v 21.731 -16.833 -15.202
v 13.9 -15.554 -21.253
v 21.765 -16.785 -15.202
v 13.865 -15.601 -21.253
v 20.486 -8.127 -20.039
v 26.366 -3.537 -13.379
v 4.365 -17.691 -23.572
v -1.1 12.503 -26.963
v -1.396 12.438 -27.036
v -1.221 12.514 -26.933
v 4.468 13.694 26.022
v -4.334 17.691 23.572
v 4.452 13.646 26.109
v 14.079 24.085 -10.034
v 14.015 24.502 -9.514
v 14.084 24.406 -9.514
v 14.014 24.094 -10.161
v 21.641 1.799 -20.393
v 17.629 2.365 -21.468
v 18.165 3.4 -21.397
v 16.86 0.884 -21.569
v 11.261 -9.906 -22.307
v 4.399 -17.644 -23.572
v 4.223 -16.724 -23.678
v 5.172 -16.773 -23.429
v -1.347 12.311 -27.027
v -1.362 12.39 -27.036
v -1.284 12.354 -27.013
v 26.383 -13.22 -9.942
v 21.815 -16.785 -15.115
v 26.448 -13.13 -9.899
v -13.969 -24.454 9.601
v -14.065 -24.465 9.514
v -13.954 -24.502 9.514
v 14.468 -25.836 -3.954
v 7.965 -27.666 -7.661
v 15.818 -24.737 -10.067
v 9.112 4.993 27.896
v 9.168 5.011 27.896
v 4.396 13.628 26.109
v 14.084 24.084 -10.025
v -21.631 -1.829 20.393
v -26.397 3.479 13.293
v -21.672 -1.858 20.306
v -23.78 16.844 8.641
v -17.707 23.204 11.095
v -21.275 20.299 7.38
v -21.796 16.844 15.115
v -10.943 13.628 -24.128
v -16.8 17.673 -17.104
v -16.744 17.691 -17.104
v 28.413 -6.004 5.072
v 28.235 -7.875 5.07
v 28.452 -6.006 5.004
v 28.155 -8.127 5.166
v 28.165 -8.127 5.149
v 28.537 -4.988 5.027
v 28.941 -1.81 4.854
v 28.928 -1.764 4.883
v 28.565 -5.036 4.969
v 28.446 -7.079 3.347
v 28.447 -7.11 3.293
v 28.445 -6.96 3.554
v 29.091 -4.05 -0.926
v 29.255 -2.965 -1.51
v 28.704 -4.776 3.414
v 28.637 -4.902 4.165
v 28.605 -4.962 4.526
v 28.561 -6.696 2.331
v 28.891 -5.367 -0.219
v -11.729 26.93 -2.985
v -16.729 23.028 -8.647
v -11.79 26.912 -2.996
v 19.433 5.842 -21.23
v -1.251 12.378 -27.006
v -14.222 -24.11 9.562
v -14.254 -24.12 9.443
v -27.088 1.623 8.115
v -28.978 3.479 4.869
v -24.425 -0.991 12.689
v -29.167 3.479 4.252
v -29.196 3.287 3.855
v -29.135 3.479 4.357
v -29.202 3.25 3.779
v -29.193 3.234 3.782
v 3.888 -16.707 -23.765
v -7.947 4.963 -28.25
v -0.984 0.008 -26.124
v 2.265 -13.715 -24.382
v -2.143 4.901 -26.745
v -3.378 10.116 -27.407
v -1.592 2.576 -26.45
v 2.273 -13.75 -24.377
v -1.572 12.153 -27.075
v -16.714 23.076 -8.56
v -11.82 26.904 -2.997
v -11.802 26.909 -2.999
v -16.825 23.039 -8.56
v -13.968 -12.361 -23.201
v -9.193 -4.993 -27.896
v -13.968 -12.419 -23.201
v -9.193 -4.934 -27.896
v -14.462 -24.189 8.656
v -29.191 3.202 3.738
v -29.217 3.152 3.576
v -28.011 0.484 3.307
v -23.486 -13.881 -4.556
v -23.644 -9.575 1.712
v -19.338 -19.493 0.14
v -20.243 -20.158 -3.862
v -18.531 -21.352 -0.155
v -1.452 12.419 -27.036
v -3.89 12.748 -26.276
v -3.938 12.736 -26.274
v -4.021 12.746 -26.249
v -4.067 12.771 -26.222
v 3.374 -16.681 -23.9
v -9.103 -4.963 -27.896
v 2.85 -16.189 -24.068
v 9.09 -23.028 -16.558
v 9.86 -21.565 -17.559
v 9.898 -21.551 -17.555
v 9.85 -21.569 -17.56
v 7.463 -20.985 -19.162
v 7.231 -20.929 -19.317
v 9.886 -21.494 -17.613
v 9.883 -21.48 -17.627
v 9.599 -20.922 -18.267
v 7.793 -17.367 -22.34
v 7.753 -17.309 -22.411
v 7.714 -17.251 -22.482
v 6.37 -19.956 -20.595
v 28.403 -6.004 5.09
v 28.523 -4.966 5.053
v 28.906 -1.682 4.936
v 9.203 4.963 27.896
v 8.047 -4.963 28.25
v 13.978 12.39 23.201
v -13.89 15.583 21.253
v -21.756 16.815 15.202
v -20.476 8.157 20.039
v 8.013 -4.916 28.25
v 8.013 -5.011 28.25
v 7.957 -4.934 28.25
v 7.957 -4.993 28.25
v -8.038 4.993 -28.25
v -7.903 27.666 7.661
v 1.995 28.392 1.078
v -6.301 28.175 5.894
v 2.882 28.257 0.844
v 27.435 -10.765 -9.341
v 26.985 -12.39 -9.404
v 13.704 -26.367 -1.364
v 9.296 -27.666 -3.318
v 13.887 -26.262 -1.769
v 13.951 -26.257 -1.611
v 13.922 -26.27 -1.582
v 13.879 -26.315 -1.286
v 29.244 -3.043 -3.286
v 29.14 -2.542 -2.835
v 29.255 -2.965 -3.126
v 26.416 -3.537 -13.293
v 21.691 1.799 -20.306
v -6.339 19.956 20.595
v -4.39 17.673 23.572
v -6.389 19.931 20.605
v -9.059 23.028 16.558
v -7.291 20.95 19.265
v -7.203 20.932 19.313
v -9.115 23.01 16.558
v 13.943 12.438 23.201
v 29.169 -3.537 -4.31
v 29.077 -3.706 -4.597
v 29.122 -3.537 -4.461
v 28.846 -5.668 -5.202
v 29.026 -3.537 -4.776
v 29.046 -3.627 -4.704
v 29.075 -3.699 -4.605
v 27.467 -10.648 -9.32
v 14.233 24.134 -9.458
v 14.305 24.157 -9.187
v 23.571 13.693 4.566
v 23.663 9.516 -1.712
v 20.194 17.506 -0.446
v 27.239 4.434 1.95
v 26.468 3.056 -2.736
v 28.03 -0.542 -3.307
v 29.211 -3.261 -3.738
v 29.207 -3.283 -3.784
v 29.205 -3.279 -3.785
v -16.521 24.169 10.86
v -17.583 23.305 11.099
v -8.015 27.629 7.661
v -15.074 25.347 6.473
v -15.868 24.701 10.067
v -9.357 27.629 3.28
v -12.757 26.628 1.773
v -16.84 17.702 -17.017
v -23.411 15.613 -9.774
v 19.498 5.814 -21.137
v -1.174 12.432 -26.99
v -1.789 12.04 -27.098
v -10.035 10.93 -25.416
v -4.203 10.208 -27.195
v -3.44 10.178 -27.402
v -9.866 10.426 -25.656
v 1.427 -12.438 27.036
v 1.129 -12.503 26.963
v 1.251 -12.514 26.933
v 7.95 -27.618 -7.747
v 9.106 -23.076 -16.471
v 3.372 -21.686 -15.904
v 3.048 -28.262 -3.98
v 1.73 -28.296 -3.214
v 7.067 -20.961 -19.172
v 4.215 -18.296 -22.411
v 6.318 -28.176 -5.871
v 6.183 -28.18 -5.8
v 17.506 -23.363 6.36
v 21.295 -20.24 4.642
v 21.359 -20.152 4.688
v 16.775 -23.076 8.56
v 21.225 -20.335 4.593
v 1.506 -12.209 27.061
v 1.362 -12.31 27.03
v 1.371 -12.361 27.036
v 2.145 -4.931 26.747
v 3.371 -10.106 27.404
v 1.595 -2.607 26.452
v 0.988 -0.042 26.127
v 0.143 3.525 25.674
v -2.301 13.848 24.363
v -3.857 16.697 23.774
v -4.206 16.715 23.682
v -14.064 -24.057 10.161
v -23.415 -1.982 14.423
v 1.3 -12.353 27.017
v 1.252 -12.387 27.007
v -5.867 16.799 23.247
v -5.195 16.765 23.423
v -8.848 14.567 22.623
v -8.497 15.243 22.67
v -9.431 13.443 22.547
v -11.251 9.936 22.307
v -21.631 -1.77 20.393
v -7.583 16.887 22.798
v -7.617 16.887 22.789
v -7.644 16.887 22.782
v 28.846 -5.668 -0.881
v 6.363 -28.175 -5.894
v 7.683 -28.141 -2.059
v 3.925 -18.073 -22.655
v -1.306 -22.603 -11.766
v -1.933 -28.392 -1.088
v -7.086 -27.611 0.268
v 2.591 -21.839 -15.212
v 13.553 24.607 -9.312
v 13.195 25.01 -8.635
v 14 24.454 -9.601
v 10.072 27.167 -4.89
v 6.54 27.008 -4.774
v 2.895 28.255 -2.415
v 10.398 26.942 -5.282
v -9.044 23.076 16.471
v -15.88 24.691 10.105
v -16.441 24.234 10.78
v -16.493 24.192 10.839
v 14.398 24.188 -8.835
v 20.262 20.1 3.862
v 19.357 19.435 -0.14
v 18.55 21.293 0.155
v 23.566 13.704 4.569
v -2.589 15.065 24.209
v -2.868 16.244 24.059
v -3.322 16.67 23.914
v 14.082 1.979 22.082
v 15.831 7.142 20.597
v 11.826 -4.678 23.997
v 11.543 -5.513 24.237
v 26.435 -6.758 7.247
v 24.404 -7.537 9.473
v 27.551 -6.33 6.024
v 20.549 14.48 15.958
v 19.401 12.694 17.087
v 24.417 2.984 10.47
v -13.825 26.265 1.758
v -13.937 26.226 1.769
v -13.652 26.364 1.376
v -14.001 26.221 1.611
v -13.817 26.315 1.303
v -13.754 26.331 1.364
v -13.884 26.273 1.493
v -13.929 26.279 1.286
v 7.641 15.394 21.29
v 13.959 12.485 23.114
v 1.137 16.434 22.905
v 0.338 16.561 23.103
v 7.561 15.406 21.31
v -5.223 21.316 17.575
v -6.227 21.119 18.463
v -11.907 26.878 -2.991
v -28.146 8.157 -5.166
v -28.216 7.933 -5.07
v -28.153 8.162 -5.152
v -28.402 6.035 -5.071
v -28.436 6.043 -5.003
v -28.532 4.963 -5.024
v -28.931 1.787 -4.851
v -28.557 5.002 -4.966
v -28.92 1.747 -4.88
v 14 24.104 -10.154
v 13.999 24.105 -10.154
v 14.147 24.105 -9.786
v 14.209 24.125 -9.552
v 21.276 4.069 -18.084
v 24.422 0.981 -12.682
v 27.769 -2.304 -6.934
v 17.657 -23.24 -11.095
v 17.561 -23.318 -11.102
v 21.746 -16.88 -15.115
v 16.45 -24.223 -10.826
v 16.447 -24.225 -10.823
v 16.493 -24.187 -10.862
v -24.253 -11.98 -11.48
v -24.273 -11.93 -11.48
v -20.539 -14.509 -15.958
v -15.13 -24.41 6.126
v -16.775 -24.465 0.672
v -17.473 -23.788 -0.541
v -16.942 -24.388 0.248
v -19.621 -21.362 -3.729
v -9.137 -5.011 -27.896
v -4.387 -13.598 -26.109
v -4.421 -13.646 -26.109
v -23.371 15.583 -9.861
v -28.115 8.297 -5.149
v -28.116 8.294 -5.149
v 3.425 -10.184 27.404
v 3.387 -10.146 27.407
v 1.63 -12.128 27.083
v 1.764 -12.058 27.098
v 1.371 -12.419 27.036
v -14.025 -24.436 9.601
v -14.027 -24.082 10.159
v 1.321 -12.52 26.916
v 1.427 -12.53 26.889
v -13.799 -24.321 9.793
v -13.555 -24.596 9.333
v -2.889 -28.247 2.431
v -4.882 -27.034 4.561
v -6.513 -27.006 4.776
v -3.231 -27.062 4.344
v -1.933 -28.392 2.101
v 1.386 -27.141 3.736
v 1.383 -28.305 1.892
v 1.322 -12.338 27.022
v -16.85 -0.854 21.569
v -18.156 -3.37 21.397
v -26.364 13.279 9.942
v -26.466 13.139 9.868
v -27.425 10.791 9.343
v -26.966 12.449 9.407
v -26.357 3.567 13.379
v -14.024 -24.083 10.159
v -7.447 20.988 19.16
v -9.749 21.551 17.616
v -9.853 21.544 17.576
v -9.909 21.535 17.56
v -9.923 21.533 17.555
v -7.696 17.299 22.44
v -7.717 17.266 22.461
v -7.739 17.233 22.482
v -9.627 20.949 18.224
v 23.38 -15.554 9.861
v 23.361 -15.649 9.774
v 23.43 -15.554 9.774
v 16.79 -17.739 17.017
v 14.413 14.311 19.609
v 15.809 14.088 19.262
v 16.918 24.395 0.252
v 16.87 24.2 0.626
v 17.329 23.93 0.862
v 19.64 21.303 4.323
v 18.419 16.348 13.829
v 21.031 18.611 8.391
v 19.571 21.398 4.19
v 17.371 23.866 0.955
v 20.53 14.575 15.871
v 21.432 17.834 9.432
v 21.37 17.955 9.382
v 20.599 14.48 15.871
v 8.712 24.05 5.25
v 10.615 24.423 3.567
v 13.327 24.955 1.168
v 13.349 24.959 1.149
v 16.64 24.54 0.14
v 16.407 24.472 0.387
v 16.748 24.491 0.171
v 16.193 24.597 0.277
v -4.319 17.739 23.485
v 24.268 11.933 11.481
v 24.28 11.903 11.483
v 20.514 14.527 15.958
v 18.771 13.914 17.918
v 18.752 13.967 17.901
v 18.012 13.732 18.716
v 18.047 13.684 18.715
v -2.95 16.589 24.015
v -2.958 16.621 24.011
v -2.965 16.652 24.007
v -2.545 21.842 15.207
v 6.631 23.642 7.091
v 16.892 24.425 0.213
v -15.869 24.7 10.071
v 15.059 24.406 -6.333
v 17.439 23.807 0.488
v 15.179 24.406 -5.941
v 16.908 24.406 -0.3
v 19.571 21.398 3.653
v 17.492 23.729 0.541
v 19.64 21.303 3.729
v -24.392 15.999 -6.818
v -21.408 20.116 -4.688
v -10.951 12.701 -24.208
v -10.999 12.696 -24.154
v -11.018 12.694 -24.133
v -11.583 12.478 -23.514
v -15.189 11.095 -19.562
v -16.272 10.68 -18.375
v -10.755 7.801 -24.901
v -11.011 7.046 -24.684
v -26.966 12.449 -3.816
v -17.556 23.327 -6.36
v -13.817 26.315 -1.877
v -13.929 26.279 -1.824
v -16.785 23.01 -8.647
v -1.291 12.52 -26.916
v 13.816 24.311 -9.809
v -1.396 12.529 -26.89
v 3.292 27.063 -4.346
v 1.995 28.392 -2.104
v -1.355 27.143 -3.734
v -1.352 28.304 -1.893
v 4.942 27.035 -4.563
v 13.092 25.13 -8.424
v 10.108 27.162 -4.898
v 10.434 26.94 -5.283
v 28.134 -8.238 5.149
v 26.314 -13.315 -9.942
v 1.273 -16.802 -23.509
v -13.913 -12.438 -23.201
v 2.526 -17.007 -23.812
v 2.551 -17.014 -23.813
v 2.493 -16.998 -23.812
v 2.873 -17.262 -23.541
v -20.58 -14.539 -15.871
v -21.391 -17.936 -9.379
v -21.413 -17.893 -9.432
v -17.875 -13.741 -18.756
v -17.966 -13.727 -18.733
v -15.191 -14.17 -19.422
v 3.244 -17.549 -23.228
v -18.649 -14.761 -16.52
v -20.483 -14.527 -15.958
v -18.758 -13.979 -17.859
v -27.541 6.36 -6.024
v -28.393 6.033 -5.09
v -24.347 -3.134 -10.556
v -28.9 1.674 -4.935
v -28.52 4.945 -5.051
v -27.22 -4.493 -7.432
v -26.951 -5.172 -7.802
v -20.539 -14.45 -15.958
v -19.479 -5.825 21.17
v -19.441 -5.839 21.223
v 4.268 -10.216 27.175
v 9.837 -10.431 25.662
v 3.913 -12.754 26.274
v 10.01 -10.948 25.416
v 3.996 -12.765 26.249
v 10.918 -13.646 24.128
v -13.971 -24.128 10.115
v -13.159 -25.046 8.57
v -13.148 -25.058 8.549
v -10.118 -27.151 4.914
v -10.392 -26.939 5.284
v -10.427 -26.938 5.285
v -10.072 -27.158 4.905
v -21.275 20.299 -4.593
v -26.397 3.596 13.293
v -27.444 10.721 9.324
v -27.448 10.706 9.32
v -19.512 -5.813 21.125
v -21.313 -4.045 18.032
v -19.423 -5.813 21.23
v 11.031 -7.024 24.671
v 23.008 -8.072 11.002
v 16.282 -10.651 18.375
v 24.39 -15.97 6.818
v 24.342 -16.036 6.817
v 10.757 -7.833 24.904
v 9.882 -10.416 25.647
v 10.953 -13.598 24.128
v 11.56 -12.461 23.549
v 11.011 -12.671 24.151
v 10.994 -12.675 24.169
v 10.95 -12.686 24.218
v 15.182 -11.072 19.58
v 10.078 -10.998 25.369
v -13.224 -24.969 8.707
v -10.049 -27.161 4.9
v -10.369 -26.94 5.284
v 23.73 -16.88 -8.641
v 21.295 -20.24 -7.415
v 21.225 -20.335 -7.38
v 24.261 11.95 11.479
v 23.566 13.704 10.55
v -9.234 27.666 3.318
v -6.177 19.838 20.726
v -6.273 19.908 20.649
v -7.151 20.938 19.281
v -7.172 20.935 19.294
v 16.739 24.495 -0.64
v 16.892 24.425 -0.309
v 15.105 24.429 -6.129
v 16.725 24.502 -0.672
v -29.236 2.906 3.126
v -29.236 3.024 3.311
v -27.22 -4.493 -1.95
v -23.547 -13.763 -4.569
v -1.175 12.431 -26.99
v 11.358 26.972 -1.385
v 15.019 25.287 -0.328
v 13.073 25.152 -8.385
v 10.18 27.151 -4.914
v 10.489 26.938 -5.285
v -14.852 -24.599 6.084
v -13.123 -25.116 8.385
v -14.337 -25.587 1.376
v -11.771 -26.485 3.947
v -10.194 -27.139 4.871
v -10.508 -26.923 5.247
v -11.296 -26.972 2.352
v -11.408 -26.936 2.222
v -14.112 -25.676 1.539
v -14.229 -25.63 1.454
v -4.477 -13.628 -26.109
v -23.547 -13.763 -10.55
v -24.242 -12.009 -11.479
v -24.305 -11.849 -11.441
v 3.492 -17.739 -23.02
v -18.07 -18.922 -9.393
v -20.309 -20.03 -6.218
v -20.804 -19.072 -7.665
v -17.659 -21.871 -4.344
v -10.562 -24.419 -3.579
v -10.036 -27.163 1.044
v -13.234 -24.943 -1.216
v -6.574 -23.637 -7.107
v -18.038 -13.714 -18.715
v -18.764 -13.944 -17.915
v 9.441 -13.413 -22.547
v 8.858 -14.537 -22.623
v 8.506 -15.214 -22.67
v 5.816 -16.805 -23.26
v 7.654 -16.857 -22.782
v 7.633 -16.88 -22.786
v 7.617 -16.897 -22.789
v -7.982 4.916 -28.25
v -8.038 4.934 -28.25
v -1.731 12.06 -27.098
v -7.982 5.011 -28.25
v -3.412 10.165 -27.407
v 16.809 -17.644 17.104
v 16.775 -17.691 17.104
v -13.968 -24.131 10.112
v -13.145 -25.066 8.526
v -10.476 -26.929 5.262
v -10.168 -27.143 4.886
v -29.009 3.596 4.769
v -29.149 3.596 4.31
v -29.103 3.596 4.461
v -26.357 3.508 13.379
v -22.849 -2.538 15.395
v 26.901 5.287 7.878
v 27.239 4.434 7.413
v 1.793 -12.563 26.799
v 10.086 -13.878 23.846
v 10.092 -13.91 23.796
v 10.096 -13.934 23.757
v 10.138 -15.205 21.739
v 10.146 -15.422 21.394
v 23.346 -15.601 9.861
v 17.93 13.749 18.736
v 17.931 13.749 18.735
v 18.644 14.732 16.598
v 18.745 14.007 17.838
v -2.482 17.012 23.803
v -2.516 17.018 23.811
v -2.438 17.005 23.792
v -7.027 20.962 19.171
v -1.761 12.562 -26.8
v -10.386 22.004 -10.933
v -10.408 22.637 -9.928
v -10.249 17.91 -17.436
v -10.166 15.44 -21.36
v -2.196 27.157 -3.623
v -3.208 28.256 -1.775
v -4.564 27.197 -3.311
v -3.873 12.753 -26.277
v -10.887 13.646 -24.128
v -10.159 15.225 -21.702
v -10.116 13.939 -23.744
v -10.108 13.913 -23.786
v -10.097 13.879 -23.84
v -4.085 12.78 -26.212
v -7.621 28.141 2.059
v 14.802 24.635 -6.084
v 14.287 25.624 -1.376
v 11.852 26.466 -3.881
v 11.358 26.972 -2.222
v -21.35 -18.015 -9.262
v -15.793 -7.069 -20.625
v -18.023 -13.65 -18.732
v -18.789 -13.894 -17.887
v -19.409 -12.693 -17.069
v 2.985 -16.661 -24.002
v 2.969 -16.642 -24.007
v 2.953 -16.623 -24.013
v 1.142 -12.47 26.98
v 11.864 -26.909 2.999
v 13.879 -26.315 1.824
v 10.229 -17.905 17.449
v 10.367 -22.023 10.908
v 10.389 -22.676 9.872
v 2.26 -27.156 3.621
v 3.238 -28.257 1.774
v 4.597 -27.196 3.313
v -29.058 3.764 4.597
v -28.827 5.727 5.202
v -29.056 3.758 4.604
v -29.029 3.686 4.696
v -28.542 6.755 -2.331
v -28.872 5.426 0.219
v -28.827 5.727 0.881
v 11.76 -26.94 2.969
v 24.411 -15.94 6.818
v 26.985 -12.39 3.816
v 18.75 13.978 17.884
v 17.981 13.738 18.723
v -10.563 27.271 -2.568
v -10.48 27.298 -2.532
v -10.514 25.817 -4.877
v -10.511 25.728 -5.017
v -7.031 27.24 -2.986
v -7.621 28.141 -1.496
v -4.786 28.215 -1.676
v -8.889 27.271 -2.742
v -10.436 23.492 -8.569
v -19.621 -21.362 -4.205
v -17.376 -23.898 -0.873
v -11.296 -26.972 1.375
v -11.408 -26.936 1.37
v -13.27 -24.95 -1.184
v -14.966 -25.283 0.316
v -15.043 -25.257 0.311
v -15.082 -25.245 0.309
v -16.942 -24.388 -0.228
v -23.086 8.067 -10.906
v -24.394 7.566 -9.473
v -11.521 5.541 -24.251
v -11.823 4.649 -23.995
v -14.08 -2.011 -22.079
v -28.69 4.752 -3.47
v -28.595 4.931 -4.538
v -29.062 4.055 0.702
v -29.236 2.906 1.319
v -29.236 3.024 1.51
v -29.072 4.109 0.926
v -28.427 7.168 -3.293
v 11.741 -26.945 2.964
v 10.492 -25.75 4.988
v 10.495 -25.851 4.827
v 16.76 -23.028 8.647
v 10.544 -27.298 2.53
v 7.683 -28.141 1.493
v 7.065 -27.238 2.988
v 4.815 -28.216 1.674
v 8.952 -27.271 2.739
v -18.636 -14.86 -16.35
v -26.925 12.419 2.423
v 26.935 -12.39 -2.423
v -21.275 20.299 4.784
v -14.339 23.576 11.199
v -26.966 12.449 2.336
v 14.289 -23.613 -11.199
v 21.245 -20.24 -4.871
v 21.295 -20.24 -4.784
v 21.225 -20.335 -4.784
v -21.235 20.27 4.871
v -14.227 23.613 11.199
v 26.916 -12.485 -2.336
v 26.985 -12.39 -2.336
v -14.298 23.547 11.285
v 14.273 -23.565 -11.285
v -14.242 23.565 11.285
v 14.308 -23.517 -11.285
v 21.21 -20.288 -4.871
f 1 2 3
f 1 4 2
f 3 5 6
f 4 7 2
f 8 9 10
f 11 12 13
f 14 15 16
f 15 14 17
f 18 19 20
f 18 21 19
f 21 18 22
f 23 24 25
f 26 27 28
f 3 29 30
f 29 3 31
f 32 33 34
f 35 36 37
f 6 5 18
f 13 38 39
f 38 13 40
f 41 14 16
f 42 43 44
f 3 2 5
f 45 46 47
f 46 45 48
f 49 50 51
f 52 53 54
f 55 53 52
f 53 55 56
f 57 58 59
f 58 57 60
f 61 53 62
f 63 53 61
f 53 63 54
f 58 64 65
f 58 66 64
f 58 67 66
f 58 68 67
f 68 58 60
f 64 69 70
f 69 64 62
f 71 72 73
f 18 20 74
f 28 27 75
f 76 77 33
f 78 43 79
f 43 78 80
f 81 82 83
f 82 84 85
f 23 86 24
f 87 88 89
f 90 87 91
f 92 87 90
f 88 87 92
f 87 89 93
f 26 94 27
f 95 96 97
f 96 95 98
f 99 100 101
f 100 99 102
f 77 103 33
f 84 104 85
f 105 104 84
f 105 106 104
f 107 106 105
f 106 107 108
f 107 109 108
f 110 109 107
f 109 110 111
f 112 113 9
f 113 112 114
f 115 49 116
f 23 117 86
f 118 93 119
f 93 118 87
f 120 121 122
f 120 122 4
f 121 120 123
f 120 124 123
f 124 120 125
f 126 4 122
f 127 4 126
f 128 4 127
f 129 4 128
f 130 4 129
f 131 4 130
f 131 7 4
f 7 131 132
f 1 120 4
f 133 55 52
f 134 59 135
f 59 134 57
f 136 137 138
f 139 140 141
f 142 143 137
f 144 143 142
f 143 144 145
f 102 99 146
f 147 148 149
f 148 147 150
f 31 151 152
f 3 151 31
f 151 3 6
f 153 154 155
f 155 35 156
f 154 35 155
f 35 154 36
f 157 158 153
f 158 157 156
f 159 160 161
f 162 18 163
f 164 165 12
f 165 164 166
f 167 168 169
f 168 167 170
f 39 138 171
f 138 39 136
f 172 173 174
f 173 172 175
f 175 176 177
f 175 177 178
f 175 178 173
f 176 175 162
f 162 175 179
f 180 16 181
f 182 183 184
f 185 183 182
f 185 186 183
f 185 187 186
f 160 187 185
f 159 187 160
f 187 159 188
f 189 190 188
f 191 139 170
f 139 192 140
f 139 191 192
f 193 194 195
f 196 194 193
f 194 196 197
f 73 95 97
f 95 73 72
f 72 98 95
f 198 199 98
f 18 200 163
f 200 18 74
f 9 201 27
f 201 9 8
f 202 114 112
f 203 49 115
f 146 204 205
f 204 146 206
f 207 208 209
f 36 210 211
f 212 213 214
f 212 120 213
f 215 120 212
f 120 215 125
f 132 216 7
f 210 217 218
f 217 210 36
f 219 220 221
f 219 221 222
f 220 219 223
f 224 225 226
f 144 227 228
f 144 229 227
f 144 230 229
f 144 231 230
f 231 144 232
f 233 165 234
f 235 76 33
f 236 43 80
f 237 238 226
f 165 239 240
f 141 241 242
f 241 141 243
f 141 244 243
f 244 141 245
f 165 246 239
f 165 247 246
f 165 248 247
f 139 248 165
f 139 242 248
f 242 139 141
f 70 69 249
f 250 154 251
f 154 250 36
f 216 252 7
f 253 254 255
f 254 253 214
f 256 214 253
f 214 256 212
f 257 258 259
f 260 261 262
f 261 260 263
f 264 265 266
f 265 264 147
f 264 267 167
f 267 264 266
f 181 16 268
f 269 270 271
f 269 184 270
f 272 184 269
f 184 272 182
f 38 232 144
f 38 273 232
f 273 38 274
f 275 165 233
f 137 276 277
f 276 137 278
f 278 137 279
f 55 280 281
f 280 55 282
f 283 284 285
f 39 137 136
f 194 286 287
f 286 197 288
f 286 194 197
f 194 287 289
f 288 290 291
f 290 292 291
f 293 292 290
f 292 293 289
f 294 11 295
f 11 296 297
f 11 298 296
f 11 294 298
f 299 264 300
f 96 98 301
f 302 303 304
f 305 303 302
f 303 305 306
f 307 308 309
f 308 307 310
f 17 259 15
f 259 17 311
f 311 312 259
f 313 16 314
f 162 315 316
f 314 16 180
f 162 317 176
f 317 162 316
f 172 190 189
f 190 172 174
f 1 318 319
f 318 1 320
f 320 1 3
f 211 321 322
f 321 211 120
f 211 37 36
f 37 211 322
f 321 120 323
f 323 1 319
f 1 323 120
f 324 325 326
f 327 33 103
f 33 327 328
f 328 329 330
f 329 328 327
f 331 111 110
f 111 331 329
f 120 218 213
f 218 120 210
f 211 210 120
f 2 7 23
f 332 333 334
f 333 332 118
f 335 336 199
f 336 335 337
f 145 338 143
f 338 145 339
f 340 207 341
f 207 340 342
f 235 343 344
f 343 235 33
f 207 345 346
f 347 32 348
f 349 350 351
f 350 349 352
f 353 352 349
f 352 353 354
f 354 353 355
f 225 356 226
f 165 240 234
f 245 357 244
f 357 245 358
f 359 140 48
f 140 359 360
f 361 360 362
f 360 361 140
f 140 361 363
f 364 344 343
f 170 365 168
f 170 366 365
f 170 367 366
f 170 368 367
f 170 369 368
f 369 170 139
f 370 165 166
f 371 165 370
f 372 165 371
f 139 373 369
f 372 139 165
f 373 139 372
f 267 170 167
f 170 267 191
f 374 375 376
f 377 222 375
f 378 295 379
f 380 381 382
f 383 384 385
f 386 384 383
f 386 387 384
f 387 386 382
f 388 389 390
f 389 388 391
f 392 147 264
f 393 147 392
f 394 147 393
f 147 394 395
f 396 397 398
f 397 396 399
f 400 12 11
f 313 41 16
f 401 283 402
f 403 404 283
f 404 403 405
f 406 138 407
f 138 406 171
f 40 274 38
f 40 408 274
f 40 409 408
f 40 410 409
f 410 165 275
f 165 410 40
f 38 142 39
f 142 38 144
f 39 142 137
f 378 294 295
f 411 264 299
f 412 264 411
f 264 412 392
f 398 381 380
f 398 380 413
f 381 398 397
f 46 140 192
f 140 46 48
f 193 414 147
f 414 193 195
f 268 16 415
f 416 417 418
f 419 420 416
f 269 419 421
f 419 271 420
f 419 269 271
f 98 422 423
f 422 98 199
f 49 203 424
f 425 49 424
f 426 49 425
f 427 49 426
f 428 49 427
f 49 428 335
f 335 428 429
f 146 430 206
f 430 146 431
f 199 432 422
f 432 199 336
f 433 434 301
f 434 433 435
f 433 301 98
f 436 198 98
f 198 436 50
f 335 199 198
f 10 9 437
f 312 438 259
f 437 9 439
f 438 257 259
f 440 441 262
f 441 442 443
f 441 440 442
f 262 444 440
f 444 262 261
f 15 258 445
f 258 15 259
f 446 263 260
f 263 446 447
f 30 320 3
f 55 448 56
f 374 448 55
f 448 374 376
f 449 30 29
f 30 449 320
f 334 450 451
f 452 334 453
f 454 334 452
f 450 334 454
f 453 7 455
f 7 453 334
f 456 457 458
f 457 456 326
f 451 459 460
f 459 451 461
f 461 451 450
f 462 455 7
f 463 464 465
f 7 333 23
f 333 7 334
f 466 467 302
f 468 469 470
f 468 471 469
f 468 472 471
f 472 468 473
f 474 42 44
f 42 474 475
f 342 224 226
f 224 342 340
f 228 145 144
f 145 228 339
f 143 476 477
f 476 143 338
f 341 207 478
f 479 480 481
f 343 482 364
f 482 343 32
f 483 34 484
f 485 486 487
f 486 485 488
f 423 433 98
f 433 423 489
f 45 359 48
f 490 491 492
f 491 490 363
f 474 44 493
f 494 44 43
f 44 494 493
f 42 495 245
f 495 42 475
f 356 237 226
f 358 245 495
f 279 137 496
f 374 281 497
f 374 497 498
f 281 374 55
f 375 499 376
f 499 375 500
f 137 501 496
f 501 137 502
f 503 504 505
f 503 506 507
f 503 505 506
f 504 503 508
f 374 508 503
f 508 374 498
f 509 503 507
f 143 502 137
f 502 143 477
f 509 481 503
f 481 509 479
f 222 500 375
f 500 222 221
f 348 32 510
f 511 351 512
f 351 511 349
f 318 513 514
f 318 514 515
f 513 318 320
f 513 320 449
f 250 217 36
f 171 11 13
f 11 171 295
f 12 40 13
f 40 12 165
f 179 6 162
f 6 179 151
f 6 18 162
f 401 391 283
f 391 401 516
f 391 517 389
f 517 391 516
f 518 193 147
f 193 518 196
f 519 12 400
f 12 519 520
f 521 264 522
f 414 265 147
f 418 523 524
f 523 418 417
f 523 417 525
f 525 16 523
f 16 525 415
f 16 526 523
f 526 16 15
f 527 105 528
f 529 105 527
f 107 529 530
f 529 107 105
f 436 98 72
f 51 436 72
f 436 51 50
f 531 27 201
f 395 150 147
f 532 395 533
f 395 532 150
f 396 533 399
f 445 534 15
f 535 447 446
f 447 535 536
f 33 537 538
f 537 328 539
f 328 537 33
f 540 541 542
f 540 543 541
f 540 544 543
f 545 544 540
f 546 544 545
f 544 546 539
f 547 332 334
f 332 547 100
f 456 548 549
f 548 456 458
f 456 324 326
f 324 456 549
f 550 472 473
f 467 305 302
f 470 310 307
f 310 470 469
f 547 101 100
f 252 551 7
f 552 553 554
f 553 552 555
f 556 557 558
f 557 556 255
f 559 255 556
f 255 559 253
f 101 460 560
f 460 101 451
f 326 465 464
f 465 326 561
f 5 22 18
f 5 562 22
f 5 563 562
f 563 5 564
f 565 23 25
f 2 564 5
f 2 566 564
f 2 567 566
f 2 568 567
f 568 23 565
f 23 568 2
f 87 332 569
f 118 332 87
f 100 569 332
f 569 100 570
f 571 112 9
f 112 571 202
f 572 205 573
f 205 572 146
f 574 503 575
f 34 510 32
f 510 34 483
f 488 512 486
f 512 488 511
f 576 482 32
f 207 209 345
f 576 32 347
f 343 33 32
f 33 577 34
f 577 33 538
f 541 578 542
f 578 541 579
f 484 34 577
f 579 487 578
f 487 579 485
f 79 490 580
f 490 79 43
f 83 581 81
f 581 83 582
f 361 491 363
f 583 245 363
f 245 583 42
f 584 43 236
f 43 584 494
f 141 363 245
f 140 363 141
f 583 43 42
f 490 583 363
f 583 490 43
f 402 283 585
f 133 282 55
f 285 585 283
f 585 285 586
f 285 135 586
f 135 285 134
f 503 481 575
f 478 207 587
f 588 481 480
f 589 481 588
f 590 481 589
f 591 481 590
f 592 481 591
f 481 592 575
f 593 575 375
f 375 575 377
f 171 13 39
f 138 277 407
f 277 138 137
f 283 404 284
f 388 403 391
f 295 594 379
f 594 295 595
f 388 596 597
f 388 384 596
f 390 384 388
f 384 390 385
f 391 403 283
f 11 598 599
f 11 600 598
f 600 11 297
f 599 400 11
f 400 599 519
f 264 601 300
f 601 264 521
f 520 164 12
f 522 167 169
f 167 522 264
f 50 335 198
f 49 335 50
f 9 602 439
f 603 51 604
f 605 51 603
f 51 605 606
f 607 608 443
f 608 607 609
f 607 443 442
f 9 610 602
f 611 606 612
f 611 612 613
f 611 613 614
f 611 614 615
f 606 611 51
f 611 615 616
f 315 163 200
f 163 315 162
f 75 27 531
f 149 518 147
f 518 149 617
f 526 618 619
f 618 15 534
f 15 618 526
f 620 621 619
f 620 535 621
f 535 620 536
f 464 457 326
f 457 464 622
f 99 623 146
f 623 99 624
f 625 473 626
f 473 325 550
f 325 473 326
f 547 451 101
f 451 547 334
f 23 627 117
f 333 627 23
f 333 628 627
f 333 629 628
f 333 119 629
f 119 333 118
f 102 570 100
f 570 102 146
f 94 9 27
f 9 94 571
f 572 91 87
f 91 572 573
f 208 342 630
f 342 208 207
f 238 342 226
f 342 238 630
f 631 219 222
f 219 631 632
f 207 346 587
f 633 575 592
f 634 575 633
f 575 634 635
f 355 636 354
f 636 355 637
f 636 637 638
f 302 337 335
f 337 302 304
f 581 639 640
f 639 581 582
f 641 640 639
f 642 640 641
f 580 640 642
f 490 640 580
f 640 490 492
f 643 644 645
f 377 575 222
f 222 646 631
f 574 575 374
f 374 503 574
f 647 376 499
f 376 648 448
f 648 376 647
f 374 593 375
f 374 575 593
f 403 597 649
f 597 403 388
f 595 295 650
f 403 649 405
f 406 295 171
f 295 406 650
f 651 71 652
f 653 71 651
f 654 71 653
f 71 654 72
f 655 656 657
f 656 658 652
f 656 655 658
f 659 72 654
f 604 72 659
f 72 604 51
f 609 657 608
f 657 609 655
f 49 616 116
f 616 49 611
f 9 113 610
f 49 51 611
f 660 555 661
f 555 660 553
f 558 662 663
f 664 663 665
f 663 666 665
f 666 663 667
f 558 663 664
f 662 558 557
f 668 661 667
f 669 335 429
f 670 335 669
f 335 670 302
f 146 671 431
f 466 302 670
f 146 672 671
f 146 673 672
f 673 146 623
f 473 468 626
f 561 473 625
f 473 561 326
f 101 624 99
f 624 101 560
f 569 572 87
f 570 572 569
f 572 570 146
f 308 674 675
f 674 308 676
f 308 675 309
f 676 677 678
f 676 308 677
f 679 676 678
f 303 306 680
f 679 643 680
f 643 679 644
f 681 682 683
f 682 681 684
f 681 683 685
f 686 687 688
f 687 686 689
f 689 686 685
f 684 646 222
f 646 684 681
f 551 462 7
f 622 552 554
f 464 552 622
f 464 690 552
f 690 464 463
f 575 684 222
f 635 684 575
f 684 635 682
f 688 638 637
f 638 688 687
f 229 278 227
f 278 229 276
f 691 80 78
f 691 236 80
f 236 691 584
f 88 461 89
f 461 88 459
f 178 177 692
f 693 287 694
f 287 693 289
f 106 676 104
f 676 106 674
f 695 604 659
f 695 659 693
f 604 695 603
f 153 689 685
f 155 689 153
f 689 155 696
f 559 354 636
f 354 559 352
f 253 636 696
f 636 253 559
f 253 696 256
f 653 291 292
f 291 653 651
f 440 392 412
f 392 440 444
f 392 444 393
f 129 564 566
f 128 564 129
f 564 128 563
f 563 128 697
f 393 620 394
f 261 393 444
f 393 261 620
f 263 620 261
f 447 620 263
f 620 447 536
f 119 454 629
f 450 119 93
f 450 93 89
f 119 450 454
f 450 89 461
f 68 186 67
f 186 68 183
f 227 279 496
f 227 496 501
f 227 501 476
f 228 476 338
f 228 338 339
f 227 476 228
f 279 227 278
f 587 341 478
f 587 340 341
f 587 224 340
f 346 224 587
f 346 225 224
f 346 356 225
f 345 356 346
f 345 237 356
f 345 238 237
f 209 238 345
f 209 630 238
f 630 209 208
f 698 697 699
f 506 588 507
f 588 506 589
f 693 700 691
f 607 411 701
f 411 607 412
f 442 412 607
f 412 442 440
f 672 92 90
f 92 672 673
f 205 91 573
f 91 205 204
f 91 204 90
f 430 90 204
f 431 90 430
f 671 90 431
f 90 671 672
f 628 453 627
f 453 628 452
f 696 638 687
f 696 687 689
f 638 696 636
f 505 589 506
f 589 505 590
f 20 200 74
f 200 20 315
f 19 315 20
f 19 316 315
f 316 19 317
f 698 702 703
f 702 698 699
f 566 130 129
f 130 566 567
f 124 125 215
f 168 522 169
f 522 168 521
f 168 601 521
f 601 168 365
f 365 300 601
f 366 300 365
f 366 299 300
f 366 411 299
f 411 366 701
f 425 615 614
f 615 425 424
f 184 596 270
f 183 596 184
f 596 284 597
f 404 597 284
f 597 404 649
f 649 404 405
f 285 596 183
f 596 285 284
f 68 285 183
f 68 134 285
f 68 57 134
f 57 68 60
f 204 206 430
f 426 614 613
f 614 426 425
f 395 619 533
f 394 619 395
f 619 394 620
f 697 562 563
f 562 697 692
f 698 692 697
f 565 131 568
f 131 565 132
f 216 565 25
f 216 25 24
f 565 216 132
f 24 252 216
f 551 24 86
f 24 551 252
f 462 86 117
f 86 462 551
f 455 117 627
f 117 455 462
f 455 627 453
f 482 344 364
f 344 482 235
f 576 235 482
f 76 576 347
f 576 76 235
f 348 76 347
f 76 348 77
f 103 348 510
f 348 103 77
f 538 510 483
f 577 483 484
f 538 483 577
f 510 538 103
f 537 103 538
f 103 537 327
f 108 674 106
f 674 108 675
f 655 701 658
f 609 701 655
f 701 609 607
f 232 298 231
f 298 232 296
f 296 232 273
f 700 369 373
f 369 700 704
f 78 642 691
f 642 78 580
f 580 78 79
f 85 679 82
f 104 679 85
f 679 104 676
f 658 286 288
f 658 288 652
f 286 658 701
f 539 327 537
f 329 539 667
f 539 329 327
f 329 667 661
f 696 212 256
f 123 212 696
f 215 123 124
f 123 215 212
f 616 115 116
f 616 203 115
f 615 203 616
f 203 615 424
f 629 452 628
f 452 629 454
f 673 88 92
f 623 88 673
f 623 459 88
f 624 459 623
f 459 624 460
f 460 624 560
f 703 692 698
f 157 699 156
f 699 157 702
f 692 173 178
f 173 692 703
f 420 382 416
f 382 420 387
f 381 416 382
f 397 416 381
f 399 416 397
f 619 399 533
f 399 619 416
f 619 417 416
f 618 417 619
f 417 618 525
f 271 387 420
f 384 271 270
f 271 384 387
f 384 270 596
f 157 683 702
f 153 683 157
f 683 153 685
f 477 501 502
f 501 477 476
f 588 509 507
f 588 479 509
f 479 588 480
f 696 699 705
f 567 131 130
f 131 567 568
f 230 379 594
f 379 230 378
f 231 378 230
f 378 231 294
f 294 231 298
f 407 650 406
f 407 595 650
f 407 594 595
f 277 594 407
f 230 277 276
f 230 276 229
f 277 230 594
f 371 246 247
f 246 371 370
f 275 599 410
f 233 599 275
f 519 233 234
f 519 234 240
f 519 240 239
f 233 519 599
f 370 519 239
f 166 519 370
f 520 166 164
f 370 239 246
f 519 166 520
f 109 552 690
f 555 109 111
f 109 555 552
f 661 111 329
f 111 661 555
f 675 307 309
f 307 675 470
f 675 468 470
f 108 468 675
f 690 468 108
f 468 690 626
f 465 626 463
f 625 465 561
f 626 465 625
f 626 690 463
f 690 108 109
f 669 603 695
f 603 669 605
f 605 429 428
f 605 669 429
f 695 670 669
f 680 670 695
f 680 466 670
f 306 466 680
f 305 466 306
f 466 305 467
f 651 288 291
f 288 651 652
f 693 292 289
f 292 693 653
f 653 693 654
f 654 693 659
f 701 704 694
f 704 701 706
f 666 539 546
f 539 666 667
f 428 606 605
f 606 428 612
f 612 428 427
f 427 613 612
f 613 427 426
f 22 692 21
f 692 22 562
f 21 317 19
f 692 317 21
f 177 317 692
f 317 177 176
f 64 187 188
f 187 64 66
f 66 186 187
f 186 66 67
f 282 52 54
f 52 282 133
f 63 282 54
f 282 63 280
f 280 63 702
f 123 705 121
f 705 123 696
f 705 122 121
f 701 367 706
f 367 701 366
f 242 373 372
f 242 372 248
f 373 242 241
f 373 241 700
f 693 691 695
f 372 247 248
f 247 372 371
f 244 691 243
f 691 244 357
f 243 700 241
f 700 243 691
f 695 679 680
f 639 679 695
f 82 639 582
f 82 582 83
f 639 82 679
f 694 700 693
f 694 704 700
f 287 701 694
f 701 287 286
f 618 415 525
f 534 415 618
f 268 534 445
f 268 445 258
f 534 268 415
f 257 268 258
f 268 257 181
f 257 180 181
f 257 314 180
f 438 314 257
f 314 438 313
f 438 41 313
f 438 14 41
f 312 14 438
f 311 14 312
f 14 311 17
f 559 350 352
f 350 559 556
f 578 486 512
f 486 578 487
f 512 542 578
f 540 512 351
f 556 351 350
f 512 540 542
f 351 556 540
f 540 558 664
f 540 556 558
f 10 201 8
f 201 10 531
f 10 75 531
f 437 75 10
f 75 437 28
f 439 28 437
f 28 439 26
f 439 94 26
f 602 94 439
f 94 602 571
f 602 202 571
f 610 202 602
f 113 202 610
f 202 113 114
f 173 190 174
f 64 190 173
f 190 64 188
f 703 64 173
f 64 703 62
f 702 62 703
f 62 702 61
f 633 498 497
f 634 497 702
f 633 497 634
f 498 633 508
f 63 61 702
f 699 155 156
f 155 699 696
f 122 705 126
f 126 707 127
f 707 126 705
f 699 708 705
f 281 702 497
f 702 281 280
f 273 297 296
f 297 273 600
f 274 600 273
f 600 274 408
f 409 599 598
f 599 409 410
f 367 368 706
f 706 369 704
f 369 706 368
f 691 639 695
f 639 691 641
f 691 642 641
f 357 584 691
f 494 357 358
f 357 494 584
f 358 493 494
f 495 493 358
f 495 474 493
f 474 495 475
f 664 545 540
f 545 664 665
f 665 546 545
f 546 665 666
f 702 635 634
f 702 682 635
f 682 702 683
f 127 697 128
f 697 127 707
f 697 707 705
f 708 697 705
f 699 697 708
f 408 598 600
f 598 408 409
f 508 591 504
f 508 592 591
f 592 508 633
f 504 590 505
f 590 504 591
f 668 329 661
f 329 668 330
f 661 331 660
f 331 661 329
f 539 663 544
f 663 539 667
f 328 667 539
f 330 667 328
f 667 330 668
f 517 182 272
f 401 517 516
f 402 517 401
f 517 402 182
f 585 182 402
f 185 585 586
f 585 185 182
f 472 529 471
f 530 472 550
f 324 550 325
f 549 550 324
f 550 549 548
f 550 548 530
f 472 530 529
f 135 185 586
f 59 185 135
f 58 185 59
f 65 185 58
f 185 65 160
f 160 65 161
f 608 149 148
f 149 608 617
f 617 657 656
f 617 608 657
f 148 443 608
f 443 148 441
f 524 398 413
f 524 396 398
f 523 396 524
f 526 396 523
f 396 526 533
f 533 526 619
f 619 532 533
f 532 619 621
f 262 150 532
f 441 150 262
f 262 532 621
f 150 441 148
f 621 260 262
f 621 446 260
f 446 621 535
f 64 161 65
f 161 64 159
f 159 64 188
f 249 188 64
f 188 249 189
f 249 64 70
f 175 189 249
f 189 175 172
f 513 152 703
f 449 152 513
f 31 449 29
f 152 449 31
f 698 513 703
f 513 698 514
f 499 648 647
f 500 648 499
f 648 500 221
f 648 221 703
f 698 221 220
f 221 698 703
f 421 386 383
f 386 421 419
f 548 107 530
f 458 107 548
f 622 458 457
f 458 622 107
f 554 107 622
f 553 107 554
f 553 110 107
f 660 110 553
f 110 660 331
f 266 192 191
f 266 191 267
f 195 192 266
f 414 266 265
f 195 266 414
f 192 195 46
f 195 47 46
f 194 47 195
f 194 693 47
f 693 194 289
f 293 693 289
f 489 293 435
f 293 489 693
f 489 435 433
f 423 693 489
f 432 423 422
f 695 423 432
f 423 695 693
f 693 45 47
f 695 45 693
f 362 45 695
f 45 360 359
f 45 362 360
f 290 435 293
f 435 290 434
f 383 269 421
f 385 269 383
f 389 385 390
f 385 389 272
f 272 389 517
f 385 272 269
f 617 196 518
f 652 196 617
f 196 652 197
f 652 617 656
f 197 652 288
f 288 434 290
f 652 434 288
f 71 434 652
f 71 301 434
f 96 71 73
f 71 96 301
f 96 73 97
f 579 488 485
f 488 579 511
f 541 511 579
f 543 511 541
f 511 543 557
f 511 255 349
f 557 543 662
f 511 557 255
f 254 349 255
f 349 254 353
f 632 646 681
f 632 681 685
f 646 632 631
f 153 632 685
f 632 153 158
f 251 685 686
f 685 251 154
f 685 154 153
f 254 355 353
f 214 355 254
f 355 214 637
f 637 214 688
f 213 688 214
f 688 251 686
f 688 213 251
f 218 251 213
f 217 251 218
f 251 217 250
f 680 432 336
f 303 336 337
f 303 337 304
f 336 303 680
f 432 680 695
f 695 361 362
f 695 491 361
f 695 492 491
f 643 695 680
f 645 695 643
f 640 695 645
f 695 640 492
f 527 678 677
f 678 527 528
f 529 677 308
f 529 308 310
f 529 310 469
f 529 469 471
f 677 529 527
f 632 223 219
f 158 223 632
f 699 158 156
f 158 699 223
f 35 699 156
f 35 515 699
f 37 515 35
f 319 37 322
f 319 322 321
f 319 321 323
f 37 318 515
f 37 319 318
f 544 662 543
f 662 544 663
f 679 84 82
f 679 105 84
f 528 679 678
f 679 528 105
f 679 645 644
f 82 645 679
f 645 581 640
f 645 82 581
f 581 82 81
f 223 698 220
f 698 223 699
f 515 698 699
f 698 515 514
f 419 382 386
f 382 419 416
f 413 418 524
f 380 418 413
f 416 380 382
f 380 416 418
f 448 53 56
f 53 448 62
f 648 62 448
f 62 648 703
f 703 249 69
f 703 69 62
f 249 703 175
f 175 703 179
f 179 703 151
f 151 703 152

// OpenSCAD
// Auto-generated OpenSCAD file

    inner_points = 10*[[-1.6451036775652808, -2.1626836934703126, -1.1975226886664396], [1.686072709471346, 2.432955782684813, 0.2356107715886286], [-1.6860727094713472, -2.4329557826848114, -0.2356107715886286], [1.6451036775652794, 2.1626836934703144, 1.1975226886664396], [-2.6884846067758437, 1.2389917062429145, 0.233618340039301], [-2.1194517463573437, 2.0240206487946675, 0.47842676129971456], [2.119451746357343, -2.0240206487946657, -0.47842676129971456], [2.6884846067758428, -1.2389917062429128, -0.233618340039301], [-0.2907283441631142, 1.0697947112799653, -2.7547493104508978], [-0.5305652343997654, -0.5124056576130412, 2.8763811346733195], [0.5305652343997641, 0.5124056576130432, -2.8763811346733195], [0.2907283441631129, -1.0697947112799635, 2.7547493104508978], [-1.8467649995645183, -1.4227471690324143, -1.839259902027394], [1.1327297390179003, 2.68771773847334, -0.5574263668434638], [-1.95402331758078, -2.130328684806416, 0.6790581910658857], [1.0254714210016385, 1.9801362226993382, 1.9608917262498158], [-1.0254714210016398, -1.9801362226993364, -1.9608917262498158], [1.9540233175807786, 2.130328684806418, -0.6790581910658857], [-1.1327297390179016, -2.687717738473338, 0.5574263668434638], [1.846764999564517, 1.422747169032416, 1.839259902027394], [-2.87456367211222, 0.5667833051879534, -0.4829780924069351], [-1.3848163028210105, 2.6220157589408304, 0.15793867518503008], [-2.915532704018286, 0.2965112159734543, 0.47893382467087603], [-1.425785334727077, 2.351743669726331, 1.1198505922628412], [1.4257853347270757, -2.3517436697263294, -1.1198505922628412], [2.9155327040182852, -0.2965112159734523, -0.47893382467087603], [1.3848163028210092, -2.6220157589408286, -0.15793867518503008], [2.874563672112219, -0.5667833051879514, 0.4829780924069351], [-1.2523453639028133, 1.0446987882266965, -2.48150417875951], [-0.6833125034843128, 1.8297277307784492, -2.2366957574990964], [-1.4668619999353363, -0.3704642433213059, 2.5551320074270496], [-0.8978291395168357, 0.4145646992304467, 2.799940428687463], [0.8978291395168344, -0.4145646992304447, -2.799940428687463], [1.466861999935335, 0.3704642433213079, -2.5551320074270496], [0.6833125034843115, -1.8297277307784474, 2.2366957574990964], [1.252345363902812, -1.0446987882266947, 2.48150417875951], [-2.214028904681588, -0.49577681218892655, -1.9157006080132506], [0.1964329734823296, 2.829659152765075, -0.8786754940897339], [-2.3466074769019785, -1.370395665307932, 1.197111744017687], [0.06385440126193956, 1.9550402996460696, 2.2341368579412038], [-0.06385440126194084, -1.9550402996460678, -2.2341368579412038], [2.3466074769019776, 1.3703956653079339, -1.197111744017687], [-0.19643297348233088, -2.8296591527650734, 0.8786754940897339], [2.2140289046815873, 0.49577681218892855, 1.9157006080132506], [-2.606613064002787, 0.2641562073095579, -1.3976470550614495], [-0.7651840462573698, 2.8045632297118064, -0.6054303623983461], [-2.7138713820190485, -0.44342530846444383, 1.1206710380318305], [-0.8724423642736312, 2.096981713937805, 1.9128877306949337], [0.8724423642736299, -2.096981713937803, -1.9128877306949337], [2.7138713820190477, 0.44342530846444583, -1.1206710380318305], [0.7651840462573685, -2.8045632297118046, 0.6054303623983461], [2.606613064002786, -0.2641562073095559, 1.3976470550614495], [-1.9869808074391464, 0.4467036780805339, -2.161016092644826], [-0.4972334381479373, 2.5019361318334106, -1.5200993250528605], [-2.1605284115656027, -0.6981872642529703, 1.913708176463923], [-0.6707810422743935, 1.3570451894999065, 2.554624944055888], [0.6707810422743922, -1.3570451894999047, -2.554624944055888], [2.160528411565602, 0.6981872642529723, -1.913708176463923], [0.49723343814793597, -2.501936131833409, 1.5200993250528605], [1.986980807439145, -0.4467036780805319, 2.161016092644826], [-1.5501088369047502, -1.3487833733431578, 2.36549645177391], [0.22122791204797956, 2.2506578071333787, -2.1686920260683786], [-0.22122791204798084, -2.250657807133377, 2.1686920260683786], [1.5501088369047489, 1.3487833733431596, -2.36549645177391], [-1.7361879022411257, -2.020991774398119, 1.648900019327674], [0.914894323678246, 2.578380828065043, -1.5272681951052522], [-0.9148943236782473, -2.578380828065041, 1.5272681951052522], [1.7361879022411244, 2.0209917743981207, -1.648900019327674], [-0.6138120713691793, -1.490724787634893, 2.6867455790201804], [0.6138120713691779, 1.4907247876348948, -2.6867455790201804]];

    outer_points = 10*[[-0.8127781095257554, -2.8451711072731785, 0.24903929976162134], [-0.13633829193286426, 2.9660232971458376, 0.04177473821664251], [0.13633829193286426, -2.9660232971458376, -0.04177473821664251], [0.8127781095257554, 2.8451711072731785, -0.24903929976162134], [0.7997377853601801, -0.49633525670734463, 2.816327084240848], [0.9152875010113133, 0.49633525670734463, 2.7809220703309587], [-0.9152875010113133, -0.49633525670734463, -2.7809220703309587], [-0.7997377853601801, 0.49633525670734463, -2.816327084240848], [-2.631631449063583, 0.3537405211795562, 1.329289666621699], [2.9245927429151473, -0.3537405211795562, -0.37316536491986596], [-2.9245927429151473, 0.3537405211795562, 0.37316536491986596], [2.631631449063583, -0.3537405211795562, -1.329289666621699], [-1.3984419351885988, -2.440647573398727, 0.9514341985555175], [-0.7934157692584937, 2.757042714100203, 0.7660511389790129], [1.0863770631100578, -2.757042714100203, 0.19007316272281993], [1.6914032290401628, 2.440647573398727, 0.00469010314631535], [-1.6914032290401628, -2.440647573398727, -0.00469010314631535], [-1.0863770631100578, 2.757042714100203, -0.19007316272281993], [0.7934157692584937, -2.757042714100203, -0.7660511389790129], [1.3984419351885988, 2.440647573398727, -0.9514341985555175], [0.14116788247970447, -1.2389964769384032, 2.6949187032084154], [0.443680965444757, 1.3598486668110619, 2.602227173420163], [1.090284283938324, -1.3598486668110619, 2.4041046652301516], [1.3927973669033766, 1.2389964769384032, 2.3114131354418994], [-1.3927973669033766, -1.2389964769384032, -2.3114131354418994], [-1.090284283938324, 1.3598486668110619, -2.4041046652301516], [-0.443680965444757, -1.3598486668110619, -2.602227173420163], [-0.14116788247970447, 1.2389964769384032, -2.6949187032084154], [-2.159102543778453, -0.17994011600586796, 2.030646502450221], [-2.0435528281273196, 0.8127303974088214, 1.9952414885403318], [2.8105354528188604, -0.8127303974088214, 0.5079244307848257], [2.9260851684699936, 0.17994011600586796, 0.4725194168749366], [-2.9260851684699936, -0.17994011600586796, -0.4725194168749366], [-2.8105354528188604, 0.8127303974088214, -0.5079244307848257], [2.0435528281273196, -0.8127303974088214, -1.9952414885403318], [2.159102543778453, 0.17994011600586796, -2.030646502450221], [-1.3969495096337523, -1.9069669362133024, 1.7971189803503202], [-0.9074730593547807, 2.298052837870938, 1.6471409346837047], [1.6744556840463214, -2.298052837870938, 0.8560249846414527], [2.163932134325293, 1.9069669362133024, 0.7060469389748373], [-2.163932134325293, -1.9069669362133024, -0.7060469389748373], [-1.6744556840463214, 2.298052837870938, -0.8560249846414527], [0.9074730593547807, -2.298052837870938, -1.6471409346837047], [1.3969495096337523, 1.9069669362133024, -1.7971189803503202], [-0.8088708886974889, -1.4479770599840374, 2.4630708022689527], [-0.4349441540696506, 1.764372200685514, 2.3484977705122265], [1.6759481096011677, -1.764372200685514, 1.7017097664362553], [2.049874844229006, 1.4479770599840374, 1.5871367346795289], [-2.049874844229006, -1.4479770599840374, -1.5871367346795289], [-1.6759481096011677, 1.764372200685514, -1.7017097664362553], [0.4349441540696506, -1.764372200685514, -2.3484977705122265], [0.8088708886974889, 1.4479770599840374, -2.4630708022689527], [-1.6874960082118968, -1.0434535261095852, 2.2093413993610165], [-1.384982925246844, 1.5553916176398799, 2.116649869572764], [2.3330255869267966, -1.5553916176398799, 0.9774333656738852], [2.6355386698918495, 1.0434535261095852, 0.8847418358856328], [-2.6355386698918495, -1.0434535261095852, -0.8847418358856328], [-2.3330255869267966, 1.5553916176398799, -0.9774333656738852], [1.384982925246844, -1.5553916176398799, -2.116649869572764], [1.6874960082118968, 1.0434535261095852, -2.2093413993610165], [2.645537886674456, -1.6785392291321632, 0.03553595709364332], [-2.17151655583448, 1.6785392291321632, 1.5115056605296813], [2.17151655583448, -1.6785392291321632, -1.5115056605296813], [-2.645537886674456, 1.6785392291321632, -0.03553595709364332], [1.9869679837939802, -2.4212004493632215, -0.08587242393878891], [-1.6940066899424162, 2.4212004493632215, 1.0419967256406217], [1.6940066899424162, -2.4212004493632215, -1.0419967256406217], [-1.9869679837939802, 2.4212004493632215, 0.08587242393878891], [2.759595176770743, -1.219549352902898, -0.8455538386110483], [-2.759595176770743, 1.219549352902898, 0.8455538386110483]];

    // Convex hull for inner set (I)
    module inner_hull() {
        hull() {
            for (p = inner_points) {
                translate(p) sphere(r=0.1);
            }
        }
    }

    // Convex hull for outer set (O) minus inner hull (O \ I)
    module outer_minus_inner() {
        difference() {
            hull() {
                for (p = outer_points) {
                    translate(p) sphere(r=0.1);
                }
            }
            inner_hull(); // Subtract inner hull
        }
    }

    // Convex hull for outer set (O) minus all translated inner hulls
    module outer_minus_AllTranslationInner() {
        difference() {
            hull() {
                for (p = outer_points) {
                    translate(p) sphere(r=0.1);
                }
            }
            hull() {
                translate([0,0,50]) inner_hull();
                translate([0,0,-50]) inner_hull();
            }; // Subtract translated inner hulls
        }
    }

    // Difference between outer_minus_inner and outer_minus_AllTranslationInner
    module outer_minus_inner_diff() {
        difference() {
            // Outer minus inner
            difference() {
                hull() {
                    for (p = outer_points) {
                        translate(p) sphere(r=0.1);
                    }
                }
                inner_hull();
            }

            // Subtract Outer minus AllTranslationInner
            difference() {
                hull() {
                    for (p = outer_points) {
                        translate(p) sphere(r=0.1);
                    }
                }
                hull() {
                    translate([0,0,50]) inner_hull();
                    translate([0,0,-50]) inner_hull();
                };
            }
        }
    }

    // Rendering all with colors applied
    color([1, 1, 0, 1]) outer_minus_inner_diff(); // Opaque yellow
    
